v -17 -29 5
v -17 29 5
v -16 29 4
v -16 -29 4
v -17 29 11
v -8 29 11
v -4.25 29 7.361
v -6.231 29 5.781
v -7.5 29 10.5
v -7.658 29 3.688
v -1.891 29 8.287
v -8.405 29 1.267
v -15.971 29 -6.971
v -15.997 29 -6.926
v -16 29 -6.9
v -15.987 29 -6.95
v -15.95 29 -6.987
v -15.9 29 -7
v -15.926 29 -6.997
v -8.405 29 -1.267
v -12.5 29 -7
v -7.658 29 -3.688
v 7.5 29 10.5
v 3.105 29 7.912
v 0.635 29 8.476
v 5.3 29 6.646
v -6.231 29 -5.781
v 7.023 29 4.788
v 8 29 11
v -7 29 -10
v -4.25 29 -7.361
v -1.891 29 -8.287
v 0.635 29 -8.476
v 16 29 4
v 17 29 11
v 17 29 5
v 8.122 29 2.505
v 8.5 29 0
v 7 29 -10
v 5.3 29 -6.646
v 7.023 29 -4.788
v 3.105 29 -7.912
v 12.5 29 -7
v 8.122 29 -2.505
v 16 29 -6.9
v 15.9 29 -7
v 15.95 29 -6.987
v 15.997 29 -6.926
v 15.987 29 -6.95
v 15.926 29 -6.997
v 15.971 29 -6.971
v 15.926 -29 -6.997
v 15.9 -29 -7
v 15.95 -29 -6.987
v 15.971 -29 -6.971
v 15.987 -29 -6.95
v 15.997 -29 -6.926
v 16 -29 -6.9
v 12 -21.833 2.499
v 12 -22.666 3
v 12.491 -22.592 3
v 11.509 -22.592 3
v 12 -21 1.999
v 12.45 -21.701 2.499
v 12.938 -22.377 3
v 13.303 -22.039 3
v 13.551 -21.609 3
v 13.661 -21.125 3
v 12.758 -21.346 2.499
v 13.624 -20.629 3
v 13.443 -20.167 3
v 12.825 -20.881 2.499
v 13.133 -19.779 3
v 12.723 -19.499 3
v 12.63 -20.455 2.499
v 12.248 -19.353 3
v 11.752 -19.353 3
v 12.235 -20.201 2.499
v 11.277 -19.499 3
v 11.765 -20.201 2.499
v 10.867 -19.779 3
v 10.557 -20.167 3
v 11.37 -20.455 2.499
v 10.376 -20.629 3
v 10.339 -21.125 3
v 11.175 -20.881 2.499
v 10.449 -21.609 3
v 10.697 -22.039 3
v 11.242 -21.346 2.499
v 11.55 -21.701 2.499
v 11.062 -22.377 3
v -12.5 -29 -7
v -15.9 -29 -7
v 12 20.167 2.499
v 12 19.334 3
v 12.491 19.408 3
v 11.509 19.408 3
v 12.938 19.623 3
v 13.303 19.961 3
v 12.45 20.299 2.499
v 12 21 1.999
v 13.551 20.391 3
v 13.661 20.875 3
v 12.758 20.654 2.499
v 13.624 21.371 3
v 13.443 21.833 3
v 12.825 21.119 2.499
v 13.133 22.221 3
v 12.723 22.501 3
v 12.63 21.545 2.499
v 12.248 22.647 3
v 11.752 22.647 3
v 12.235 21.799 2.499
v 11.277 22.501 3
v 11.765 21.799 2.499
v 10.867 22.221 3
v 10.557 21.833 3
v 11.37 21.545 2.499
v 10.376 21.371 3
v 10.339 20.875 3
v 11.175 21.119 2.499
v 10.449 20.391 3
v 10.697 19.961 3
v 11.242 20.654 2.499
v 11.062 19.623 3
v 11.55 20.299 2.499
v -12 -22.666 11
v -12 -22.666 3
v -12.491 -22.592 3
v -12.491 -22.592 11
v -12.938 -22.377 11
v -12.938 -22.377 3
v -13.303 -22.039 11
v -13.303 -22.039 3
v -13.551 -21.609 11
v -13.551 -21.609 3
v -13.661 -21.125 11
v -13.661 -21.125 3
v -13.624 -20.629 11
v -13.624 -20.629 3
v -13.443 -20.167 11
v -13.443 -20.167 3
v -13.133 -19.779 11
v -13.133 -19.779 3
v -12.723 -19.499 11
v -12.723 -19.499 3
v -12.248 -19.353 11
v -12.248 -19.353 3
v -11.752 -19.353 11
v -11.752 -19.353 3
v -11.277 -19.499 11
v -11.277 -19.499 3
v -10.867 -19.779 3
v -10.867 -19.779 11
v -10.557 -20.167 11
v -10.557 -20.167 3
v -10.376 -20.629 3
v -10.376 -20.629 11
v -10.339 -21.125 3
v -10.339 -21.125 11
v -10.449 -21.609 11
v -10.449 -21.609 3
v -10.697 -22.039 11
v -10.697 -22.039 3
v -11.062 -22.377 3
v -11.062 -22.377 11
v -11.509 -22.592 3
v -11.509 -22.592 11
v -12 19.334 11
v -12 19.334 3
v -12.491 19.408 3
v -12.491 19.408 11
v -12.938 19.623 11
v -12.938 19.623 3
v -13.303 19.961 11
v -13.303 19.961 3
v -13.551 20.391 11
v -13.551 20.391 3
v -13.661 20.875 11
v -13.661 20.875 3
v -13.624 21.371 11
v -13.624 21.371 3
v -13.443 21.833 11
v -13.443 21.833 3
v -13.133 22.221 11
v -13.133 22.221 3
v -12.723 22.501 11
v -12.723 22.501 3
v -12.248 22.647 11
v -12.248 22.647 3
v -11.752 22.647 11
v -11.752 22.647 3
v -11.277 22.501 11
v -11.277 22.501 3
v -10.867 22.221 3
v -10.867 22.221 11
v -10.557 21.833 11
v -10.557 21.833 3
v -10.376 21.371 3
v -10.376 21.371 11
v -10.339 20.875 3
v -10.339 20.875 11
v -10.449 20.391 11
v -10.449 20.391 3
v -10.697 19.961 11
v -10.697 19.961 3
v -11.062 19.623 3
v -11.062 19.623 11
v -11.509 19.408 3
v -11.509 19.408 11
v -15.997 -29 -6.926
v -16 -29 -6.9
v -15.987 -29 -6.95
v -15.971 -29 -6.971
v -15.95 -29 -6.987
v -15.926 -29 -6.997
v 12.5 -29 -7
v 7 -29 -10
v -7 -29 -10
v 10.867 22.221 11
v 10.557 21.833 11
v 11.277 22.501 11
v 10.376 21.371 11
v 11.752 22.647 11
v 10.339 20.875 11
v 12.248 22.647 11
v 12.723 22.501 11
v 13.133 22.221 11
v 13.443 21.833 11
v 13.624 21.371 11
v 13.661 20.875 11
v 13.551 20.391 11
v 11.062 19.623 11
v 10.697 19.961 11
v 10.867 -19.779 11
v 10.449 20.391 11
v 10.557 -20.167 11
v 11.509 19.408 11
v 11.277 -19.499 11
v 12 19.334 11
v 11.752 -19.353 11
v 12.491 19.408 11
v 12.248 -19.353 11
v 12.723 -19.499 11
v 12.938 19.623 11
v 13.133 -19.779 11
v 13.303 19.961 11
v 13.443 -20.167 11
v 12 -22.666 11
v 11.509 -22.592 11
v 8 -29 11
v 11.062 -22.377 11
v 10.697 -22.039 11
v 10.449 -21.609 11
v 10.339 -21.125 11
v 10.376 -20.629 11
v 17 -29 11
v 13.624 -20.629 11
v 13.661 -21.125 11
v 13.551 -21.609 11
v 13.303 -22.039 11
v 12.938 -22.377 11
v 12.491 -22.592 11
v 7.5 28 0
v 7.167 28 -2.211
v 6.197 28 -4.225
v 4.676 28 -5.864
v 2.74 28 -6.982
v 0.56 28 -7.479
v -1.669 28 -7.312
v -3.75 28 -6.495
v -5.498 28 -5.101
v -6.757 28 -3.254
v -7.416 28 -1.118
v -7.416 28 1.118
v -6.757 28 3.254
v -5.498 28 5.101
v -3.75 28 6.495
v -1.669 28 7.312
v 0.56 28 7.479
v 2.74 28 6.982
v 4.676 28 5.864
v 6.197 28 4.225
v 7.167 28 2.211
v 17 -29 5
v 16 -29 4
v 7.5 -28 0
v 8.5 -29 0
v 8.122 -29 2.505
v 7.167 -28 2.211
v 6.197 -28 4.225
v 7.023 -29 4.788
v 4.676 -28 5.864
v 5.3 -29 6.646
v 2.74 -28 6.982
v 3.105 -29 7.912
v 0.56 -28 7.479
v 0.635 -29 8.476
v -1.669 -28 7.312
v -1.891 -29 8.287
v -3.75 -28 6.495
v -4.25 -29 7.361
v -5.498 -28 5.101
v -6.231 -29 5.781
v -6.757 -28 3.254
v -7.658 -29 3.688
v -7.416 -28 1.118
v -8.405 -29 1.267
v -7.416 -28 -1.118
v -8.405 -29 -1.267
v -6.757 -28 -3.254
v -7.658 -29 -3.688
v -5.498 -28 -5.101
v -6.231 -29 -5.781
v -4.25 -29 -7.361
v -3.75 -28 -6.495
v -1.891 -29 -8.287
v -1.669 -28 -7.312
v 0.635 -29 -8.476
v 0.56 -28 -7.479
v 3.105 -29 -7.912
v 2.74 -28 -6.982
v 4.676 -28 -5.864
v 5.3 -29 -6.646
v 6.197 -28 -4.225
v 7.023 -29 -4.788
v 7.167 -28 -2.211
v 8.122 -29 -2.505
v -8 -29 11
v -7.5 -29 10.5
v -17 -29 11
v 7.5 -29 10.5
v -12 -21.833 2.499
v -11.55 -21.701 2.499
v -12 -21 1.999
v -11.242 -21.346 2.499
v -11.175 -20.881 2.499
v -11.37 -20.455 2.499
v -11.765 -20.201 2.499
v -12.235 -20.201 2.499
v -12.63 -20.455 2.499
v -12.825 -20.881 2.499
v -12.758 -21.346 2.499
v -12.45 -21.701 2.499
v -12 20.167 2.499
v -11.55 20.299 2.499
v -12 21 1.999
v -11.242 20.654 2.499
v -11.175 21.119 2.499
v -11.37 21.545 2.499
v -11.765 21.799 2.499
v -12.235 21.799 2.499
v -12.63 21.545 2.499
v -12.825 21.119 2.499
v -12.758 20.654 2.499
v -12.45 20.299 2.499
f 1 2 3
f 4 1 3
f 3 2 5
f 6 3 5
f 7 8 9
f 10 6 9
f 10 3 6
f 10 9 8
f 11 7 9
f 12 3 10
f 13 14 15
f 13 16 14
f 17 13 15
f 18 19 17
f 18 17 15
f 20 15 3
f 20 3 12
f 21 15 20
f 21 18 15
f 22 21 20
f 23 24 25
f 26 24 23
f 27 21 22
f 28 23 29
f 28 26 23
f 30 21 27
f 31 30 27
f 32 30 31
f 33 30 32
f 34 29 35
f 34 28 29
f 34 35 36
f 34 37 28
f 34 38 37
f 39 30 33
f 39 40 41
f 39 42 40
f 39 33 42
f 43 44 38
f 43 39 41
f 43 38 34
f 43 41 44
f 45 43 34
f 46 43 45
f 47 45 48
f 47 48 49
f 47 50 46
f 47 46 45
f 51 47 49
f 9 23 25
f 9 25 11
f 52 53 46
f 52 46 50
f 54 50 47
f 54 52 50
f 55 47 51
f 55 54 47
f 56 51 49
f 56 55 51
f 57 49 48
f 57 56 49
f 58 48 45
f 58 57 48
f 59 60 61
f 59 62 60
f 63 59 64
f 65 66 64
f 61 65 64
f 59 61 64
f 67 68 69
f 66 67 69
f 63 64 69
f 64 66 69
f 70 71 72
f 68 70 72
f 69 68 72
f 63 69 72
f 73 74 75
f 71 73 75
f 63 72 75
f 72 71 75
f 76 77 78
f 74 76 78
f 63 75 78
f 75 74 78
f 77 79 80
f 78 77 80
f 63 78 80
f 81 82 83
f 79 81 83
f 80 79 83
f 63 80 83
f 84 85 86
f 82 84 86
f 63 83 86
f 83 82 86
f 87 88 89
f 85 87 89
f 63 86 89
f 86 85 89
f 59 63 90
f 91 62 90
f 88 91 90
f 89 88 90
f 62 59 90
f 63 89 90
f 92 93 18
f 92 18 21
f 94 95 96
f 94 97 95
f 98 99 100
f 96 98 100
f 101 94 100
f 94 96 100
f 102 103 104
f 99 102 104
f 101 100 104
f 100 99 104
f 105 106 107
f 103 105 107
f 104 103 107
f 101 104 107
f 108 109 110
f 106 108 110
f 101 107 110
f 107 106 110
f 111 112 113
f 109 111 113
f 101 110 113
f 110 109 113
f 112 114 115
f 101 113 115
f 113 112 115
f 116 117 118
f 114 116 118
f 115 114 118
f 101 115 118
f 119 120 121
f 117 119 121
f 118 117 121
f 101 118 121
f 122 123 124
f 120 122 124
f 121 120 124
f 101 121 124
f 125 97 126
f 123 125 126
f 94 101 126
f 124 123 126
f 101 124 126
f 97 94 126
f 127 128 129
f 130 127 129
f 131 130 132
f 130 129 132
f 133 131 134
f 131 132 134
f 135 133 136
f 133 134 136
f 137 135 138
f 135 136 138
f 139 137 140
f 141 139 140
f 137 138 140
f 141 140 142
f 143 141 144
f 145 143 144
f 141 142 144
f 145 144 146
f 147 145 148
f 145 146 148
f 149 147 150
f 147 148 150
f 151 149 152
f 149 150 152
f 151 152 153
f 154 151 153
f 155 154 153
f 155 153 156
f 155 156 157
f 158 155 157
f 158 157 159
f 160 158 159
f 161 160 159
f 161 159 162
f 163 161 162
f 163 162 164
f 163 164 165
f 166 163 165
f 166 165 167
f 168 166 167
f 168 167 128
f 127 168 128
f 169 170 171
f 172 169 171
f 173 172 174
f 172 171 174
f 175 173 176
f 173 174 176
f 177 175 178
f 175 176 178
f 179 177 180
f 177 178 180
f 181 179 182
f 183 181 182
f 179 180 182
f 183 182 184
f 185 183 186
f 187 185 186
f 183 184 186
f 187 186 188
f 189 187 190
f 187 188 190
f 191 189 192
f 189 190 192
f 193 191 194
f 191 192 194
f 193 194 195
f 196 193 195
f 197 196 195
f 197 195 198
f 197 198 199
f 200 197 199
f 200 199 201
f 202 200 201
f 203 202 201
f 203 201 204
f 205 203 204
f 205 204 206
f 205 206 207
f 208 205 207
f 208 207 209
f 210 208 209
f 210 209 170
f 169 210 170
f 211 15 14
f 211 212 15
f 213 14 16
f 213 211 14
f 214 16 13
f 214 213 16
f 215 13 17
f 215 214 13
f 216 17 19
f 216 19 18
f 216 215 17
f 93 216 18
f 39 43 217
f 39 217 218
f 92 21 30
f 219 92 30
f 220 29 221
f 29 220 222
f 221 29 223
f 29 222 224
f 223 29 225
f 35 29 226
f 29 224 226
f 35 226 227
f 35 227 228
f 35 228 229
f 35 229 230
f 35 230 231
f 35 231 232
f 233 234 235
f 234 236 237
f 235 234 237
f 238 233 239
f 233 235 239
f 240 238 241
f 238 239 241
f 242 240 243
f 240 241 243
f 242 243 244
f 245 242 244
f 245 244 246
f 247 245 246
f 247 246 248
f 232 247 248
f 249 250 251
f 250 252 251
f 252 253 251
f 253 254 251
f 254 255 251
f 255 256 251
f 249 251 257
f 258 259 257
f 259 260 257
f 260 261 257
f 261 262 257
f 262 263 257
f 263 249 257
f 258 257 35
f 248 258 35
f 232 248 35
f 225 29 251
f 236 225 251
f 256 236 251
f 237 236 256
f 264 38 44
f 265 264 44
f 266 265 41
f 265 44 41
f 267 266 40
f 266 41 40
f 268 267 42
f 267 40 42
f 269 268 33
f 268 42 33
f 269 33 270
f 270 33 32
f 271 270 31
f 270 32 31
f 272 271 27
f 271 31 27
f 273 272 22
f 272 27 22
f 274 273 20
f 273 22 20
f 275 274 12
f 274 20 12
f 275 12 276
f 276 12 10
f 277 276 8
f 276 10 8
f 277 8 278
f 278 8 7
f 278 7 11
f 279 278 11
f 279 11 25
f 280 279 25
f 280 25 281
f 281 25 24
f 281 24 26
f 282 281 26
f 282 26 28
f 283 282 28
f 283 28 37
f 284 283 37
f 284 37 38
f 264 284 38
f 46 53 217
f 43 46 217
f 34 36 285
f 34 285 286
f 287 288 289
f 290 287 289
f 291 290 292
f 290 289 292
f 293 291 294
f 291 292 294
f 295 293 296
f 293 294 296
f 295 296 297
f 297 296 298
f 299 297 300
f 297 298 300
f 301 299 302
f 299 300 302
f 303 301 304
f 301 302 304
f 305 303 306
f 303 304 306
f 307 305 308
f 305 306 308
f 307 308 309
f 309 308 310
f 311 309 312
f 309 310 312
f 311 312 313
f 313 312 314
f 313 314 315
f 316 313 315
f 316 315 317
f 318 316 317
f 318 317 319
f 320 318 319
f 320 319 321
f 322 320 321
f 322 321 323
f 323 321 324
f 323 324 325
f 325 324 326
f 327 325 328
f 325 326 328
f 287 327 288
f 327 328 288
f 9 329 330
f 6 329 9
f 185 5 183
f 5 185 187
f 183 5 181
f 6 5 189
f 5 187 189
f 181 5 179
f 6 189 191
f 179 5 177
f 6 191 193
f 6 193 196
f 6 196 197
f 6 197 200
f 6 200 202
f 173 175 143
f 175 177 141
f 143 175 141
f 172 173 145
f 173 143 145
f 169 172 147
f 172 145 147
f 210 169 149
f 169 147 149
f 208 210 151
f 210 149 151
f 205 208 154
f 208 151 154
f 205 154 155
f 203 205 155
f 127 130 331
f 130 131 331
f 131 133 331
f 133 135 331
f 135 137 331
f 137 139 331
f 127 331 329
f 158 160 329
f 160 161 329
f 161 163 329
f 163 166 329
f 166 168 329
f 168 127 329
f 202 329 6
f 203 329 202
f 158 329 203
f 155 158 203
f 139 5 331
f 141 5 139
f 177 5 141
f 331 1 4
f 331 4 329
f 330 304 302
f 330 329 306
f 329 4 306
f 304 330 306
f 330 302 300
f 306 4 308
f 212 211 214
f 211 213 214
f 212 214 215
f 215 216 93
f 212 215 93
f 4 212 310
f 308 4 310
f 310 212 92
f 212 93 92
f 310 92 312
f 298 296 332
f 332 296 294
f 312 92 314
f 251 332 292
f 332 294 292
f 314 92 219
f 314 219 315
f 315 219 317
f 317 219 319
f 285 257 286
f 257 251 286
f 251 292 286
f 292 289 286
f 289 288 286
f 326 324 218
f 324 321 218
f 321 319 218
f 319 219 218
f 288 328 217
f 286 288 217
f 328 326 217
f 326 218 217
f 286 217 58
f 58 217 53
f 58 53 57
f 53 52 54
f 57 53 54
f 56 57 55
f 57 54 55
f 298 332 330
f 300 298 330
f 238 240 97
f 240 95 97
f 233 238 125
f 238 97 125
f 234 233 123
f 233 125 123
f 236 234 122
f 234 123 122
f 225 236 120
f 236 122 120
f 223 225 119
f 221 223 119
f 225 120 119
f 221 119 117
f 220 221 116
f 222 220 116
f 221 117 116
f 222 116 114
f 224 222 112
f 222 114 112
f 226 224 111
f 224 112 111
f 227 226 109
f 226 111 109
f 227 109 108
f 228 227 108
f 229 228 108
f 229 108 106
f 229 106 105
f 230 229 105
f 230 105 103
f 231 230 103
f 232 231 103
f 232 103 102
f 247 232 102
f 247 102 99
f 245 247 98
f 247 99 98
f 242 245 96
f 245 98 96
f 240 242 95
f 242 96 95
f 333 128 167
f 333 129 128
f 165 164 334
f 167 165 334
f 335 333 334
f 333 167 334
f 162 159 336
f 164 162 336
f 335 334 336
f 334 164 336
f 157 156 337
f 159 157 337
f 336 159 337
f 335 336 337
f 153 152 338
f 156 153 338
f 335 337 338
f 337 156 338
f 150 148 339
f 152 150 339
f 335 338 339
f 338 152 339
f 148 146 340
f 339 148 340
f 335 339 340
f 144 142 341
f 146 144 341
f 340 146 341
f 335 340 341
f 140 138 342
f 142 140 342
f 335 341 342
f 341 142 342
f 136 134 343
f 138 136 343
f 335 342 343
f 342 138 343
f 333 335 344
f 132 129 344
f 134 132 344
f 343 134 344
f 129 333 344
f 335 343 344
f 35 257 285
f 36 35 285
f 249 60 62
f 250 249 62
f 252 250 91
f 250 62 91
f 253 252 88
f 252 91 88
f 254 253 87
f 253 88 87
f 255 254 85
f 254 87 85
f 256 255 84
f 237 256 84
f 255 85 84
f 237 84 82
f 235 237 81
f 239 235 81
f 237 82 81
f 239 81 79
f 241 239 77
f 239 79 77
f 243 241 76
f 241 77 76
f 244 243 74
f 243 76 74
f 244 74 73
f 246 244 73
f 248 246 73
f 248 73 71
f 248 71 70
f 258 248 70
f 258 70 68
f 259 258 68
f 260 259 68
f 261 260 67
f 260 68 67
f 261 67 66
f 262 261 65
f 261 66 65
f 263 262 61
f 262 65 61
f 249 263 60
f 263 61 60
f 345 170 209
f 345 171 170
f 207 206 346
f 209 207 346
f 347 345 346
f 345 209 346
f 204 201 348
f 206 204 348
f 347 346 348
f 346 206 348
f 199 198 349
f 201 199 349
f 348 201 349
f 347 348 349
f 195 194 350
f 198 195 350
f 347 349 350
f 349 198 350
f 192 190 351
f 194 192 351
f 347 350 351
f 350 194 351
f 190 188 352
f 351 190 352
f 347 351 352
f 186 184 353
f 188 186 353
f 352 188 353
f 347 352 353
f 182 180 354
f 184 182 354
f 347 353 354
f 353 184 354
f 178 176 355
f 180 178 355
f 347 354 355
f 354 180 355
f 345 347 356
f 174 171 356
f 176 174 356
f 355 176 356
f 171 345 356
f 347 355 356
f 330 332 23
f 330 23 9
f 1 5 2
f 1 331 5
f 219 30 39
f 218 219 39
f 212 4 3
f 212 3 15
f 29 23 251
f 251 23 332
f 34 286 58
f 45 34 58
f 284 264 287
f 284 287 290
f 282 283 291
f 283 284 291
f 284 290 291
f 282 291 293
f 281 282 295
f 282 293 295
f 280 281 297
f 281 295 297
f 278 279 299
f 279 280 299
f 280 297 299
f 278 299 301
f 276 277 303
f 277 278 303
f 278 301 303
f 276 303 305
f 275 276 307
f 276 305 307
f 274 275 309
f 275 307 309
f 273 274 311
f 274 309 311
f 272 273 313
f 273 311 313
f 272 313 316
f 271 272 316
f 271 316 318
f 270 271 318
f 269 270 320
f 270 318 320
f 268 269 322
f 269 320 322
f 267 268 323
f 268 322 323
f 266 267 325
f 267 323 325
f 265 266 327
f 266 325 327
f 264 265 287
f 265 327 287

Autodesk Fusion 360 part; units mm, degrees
sketch "Sketch1" plane through (0, 0, 0) normal (0, 1, 0) x (1, 0, 0)
  circle A0 centre (0, 0) radius 7.5
  line L0 (-17, -11) -> (17, -11)
  line L1 (17, -11) -> (17, -5)
  line L2 (17, -5) -> (16, -4)
  line L3 (16, -4) -> (16, 7)
  line L4 (16, 7) -> (12.5, 7)
  line L5 (12.5, 7) -> (7, 10)
  line L6 (-17, -11) -> (-17, -5)
  line L7 (-17, -5) -> (-16, -4)
  line L8 (-16, -4) -> (-16, 7)
  line L9 (-16, 7) -> (-12.5, 7)
  line L10 (-12.5, 7) -> (-7, 10)
  line L11 (-7, 10) -> (7, 10)
  dimension "d1" = 15
  dimension "d2" = 34
  dimension "d3" = 14
  dimension "d4" = 21
extrude "Extrude1" add sketch "Sketch1" along normal mid plane 58
sketch "Sketch2" plane through (0, 0, 11) normal (0, 0, 1) x (-1, 0, 0)
  line L0 (-17, 29) -> (-17, -29)
  line L1 (-17, -29) -> (17, -29)
  line L2 (17, -29) -> (17, 29)
  line L3 (17, 29) -> (-17, 29)
  line L4 (0, -21) -> (0, 21) construction
  line L5 (17, 0) -> (-17, 0) construction
  line L6 (-12, -21) -> (12, -21) construction
  line L7 (12, 21) -> (-12, 21) construction
  circle A0 centre (-12, -21) radius 2
  circle A1 centre (-12, 21) radius 2
  circle A2 centre (12, 21) radius 2
  circle A3 centre (12, -21) radius 2
  line L8 (8, -29) -> (8, 29)
  line L9 (-10, -21) -> (-8, -21)
  line L10 (-8, -29) -> (-8, 29)
  dimension "d7" = 42
  dimension "d8" = 24
  dimension "d13" = 16
hole "Hole1" at (12, 21, 11) at (-12, 21, 11) at (-12, -21, 11) at (12, -21, 11) direction (0, 0, -1) diameter 3.332 depth 8 tip angle 118
chamfer "Chamfer1" distance 1 angle 45 2 edges at (-6.9925, -29, 2.7121) (-6.9925, 29, -2.7121)
extrude "Extrude2" cut sketch "Sketch2" against normal blind 0.5 contours L1 L3 L8 L10
chamfer "Chamfer2" distance 0.5 angle 45 2 edges at (-8, 0, 10.5) (8, 0, 10.5)
fillet "Fillet1" radius 0.1 2 edges at (16, 0, -7) (-16, 0, -7)
